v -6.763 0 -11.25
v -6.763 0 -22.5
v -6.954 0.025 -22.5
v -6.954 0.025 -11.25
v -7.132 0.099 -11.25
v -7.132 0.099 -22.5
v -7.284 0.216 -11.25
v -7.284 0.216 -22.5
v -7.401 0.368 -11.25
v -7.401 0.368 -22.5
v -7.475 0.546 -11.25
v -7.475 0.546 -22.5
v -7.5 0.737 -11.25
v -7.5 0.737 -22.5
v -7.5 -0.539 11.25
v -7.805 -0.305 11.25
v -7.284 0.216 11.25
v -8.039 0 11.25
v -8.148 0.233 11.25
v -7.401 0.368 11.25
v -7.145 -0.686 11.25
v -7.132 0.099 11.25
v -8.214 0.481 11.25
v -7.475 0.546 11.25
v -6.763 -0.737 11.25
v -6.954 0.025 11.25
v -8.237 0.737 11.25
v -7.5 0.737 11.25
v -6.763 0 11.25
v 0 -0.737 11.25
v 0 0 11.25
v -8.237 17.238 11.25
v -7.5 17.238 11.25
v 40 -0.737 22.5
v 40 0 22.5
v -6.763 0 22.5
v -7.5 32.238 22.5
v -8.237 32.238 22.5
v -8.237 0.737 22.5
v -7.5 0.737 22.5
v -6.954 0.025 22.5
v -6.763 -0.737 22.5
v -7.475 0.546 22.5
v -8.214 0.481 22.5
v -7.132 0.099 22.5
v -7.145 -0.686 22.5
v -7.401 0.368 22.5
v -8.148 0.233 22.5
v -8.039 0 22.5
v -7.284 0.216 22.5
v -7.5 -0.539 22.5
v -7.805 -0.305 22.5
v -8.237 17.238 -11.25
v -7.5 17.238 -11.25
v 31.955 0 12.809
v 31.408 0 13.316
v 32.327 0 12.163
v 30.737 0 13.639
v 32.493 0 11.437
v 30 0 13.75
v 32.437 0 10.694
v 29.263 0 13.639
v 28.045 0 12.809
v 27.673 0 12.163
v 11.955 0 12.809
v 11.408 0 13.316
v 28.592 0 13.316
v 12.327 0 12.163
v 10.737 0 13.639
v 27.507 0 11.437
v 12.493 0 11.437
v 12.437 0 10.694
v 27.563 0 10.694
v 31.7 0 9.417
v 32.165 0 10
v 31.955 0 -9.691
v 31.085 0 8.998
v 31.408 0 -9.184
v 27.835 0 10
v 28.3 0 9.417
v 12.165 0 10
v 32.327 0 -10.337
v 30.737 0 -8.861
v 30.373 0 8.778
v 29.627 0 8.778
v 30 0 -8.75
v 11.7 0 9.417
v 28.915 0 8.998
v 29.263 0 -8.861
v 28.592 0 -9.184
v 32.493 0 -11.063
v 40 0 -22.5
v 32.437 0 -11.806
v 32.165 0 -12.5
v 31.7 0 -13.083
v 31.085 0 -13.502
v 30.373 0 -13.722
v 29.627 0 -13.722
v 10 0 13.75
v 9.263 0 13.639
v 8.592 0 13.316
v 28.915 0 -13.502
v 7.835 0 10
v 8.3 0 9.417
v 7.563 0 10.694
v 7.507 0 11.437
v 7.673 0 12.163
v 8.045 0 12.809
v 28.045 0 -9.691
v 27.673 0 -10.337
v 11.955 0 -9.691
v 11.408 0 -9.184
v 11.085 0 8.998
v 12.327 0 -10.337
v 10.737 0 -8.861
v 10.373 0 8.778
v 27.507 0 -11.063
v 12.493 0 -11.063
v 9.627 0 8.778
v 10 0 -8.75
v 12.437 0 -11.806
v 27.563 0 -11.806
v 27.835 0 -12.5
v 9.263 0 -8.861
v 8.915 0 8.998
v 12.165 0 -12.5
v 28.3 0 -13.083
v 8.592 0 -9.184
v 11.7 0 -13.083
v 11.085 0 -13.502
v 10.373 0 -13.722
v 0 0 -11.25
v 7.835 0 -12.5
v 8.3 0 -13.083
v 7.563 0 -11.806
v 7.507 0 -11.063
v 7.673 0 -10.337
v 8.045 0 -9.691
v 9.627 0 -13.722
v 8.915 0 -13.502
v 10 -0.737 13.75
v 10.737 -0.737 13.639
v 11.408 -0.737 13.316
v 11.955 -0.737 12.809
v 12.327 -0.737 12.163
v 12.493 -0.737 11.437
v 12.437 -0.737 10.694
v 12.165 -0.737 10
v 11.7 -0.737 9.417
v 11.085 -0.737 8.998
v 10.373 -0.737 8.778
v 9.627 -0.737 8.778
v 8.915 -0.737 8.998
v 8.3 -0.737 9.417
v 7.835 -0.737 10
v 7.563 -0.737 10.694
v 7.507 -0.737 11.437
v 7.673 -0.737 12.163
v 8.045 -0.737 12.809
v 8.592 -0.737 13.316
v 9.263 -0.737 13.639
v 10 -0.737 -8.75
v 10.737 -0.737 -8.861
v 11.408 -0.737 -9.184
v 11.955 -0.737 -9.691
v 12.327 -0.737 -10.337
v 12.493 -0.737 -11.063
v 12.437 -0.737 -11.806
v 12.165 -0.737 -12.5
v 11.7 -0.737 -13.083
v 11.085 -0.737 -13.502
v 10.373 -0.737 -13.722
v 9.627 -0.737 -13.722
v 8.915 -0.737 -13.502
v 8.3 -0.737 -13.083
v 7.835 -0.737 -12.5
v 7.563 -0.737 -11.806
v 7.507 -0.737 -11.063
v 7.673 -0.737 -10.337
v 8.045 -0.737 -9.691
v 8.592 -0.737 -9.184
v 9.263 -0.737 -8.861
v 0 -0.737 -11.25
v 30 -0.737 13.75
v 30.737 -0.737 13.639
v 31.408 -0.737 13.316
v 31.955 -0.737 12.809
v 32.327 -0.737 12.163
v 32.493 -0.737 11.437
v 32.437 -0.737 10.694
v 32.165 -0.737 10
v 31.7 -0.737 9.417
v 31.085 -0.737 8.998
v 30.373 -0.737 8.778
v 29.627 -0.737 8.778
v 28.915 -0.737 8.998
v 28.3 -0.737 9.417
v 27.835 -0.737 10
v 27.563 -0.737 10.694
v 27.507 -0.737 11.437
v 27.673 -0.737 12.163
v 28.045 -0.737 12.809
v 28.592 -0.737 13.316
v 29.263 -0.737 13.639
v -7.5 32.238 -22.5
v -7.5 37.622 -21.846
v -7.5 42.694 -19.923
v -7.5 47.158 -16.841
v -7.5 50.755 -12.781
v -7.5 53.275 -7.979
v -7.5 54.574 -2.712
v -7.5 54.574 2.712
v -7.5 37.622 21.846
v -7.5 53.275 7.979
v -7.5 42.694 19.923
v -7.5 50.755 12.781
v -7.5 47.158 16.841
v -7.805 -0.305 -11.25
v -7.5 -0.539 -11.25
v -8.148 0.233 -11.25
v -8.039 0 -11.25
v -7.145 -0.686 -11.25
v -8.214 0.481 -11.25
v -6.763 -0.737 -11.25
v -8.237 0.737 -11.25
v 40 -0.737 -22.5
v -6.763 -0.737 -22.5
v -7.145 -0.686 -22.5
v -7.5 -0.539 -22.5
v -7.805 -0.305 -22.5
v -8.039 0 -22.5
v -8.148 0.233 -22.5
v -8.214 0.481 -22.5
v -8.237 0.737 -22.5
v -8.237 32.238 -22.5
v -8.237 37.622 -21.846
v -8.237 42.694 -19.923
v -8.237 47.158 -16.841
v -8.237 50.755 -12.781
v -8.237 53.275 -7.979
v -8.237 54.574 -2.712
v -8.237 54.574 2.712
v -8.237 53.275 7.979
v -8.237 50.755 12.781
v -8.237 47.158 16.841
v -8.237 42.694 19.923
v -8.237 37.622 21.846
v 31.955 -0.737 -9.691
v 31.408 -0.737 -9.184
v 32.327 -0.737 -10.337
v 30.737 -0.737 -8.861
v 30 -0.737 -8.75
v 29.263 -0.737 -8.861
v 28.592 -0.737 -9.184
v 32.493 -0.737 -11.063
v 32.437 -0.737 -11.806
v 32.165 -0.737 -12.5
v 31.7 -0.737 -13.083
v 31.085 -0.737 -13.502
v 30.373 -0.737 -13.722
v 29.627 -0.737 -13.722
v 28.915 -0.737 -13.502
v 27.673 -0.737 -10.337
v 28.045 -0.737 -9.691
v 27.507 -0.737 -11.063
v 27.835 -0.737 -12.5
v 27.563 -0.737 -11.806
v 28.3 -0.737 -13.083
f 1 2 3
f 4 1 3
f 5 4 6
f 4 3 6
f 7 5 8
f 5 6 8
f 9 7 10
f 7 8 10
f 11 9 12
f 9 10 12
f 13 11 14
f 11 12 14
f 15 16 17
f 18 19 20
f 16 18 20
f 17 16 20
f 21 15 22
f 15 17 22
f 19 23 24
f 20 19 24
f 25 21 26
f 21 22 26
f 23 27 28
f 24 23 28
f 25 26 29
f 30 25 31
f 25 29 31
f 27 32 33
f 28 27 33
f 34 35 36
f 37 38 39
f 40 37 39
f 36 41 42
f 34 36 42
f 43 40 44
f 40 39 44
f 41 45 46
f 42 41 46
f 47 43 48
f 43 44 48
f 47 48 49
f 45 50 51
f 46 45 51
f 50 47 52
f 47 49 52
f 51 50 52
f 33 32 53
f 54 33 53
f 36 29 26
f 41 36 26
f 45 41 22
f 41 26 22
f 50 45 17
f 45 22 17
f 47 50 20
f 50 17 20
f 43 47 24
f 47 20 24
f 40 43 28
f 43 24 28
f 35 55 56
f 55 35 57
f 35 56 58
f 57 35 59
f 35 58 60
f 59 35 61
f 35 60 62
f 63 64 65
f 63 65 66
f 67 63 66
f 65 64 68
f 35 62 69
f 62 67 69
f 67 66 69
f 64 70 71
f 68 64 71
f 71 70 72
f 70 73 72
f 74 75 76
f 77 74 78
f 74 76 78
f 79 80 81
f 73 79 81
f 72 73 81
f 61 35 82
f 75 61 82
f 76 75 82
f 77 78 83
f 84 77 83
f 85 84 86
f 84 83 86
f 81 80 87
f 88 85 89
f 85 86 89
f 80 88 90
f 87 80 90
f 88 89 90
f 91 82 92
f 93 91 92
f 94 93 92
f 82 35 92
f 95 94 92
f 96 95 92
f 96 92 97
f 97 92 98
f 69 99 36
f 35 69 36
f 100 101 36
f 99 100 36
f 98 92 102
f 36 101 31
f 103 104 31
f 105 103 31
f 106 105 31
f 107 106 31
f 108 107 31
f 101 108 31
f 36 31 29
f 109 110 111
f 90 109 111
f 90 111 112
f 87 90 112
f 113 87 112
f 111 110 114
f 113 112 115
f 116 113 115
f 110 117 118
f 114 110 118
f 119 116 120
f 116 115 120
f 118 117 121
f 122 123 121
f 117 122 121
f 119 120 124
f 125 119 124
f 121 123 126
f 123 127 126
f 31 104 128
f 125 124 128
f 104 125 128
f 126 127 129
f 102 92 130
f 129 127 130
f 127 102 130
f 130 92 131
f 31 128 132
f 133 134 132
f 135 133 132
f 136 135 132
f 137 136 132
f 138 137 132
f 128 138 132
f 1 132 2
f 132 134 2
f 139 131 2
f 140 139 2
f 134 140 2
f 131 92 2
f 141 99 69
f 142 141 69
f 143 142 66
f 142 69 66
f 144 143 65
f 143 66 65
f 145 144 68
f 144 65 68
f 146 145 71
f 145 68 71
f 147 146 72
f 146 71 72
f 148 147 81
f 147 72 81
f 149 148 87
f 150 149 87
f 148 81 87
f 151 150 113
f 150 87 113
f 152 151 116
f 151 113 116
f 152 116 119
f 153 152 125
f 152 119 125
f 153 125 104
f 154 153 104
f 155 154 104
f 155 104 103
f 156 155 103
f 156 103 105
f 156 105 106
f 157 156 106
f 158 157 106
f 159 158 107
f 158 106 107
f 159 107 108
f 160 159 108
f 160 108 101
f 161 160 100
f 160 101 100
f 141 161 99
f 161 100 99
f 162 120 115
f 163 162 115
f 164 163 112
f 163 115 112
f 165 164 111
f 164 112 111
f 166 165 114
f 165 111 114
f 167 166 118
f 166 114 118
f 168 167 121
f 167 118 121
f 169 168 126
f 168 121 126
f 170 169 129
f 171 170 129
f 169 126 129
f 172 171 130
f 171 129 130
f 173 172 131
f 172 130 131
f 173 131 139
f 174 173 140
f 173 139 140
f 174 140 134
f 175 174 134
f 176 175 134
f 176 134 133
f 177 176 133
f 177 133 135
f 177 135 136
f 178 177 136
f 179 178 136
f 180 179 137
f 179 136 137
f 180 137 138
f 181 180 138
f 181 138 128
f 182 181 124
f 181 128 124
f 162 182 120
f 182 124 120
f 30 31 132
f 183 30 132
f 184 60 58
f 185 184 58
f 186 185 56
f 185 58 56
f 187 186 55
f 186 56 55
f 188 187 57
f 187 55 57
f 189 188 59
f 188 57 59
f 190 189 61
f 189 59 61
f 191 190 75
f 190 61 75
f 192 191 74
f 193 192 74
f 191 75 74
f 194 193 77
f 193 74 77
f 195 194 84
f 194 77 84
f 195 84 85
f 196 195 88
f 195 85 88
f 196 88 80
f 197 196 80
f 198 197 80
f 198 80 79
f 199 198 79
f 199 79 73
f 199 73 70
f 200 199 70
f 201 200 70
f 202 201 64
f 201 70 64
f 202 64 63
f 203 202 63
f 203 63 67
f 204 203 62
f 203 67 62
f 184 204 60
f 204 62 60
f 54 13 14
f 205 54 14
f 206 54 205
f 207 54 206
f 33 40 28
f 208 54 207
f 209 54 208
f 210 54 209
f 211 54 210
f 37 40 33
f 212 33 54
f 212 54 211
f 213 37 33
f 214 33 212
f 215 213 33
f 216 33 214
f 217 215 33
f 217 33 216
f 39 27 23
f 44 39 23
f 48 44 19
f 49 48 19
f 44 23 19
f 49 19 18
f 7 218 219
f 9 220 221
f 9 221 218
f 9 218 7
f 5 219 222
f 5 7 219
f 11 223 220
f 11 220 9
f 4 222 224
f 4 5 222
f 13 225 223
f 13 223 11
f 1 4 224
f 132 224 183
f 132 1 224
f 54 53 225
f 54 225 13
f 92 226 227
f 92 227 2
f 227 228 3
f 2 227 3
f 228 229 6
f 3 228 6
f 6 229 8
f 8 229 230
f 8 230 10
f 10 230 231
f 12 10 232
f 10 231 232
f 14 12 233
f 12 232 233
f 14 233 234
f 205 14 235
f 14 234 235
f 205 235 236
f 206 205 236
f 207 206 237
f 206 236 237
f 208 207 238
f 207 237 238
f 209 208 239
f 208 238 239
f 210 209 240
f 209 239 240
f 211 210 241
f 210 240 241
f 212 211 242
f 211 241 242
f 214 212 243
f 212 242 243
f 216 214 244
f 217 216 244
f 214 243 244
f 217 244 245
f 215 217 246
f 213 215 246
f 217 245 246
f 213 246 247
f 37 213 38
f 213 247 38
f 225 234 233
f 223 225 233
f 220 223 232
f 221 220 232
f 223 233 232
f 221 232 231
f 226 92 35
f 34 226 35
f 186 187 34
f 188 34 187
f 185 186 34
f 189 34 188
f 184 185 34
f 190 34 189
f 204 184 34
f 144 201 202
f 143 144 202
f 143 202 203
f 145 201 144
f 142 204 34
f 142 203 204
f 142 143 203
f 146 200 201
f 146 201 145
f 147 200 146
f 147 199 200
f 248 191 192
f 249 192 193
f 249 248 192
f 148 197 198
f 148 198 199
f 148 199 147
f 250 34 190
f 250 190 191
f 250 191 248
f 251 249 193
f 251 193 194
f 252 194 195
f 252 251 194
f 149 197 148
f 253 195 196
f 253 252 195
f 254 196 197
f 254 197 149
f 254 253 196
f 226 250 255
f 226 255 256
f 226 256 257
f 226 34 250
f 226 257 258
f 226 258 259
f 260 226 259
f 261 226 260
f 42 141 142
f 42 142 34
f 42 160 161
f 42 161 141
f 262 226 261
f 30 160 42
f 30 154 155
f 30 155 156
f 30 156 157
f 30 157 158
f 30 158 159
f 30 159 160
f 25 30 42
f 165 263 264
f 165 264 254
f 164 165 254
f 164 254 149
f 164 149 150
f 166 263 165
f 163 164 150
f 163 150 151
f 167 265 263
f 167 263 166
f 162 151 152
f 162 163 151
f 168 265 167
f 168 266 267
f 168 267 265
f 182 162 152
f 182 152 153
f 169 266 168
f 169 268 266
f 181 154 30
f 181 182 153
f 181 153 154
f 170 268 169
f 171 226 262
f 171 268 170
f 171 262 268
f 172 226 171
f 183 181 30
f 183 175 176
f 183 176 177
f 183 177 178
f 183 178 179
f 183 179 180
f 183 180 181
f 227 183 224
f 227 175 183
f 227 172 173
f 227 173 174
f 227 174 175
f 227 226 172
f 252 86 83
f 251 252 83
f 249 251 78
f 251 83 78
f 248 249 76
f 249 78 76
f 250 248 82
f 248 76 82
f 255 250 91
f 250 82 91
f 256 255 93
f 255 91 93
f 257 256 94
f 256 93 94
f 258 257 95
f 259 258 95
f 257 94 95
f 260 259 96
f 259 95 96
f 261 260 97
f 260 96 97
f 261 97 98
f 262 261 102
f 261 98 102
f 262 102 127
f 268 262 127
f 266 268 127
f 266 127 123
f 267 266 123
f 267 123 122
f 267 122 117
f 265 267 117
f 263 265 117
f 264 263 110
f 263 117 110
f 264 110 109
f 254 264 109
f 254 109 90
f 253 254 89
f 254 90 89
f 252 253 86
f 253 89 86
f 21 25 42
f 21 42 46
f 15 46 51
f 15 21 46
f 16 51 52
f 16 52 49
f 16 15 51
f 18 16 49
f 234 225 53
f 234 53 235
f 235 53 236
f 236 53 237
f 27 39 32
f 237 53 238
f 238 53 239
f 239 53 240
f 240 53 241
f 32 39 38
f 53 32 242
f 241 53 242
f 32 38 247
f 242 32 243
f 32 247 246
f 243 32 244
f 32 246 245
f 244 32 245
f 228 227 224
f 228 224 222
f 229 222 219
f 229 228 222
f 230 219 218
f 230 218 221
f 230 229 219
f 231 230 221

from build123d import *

# Parameters (mm, degrees)
SKETCH1_R                  = 2.5
SKETCH1_W                  = 25
SKETCH1_H                  = 22.5
BASE_FLANGE3_DEPTH         = 0.7366
SKETCHED_START             = -22.5
SKETCHED_BEND1_DEPTH       = 45
SKETCHED_BEND1_2_DEPTH     = 11.25
SKETCHED_START_2           = 11.25
SKETCHED_BEND1_3_DEPTH     = 11.25
SKETCHED_START_3           = -63
SKETCHED_BEND1_4_OUTLINE_W = 0.7366
SKETCHED_BEND1_4_OUTLINE_H = 45
SKETCHED_BEND1_4_DEPTH     = 38
SKETCHED_START_4           = -8.2366
SKETCHED_BEND1_5_DEPTH     = 0.7366


with BuildPart() as part:
    # Base-Flange3: sheet metal written as solids
    # Sketch1 → Base-Flange3 (new body)
    with BuildSketch(Plane(origin=(0, 0, 0), x_dir=(1, 0, 0), z_dir=(0, 1, 0))):
        with BuildLine():
            Line((-40, 22.5), (40, 22.5))
            Line((40, 22.5), (40, -22.5))
            Line((40, -22.5), (-40, -22.5))
            ThreePointArc((-40, -22.5), (-62.5, 0), (-40, 22.5))
        make_face()
        with Locations(Location((10, -11.25, 0), (0, 0, 270))):
            Circle(SKETCH1_R, mode=Mode.SUBTRACT)
        with Locations(Location((10, 11.25, 0), (0, 0, 270))):
            Circle(SKETCH1_R, mode=Mode.SUBTRACT)
        with Locations(Location((30, -11.25, 0), (0, 0, 270))):
            Circle(SKETCH1_R, mode=Mode.SUBTRACT)
        with Locations(Location((30, 11.25, 0), (0, 0, 270))):
            Circle(SKETCH1_R, mode=Mode.SUBTRACT)
        with Locations((-12.5, 0)):
            Rectangle(SKETCH1_W, SKETCH1_H, mode=Mode.SUBTRACT)
    extrude(amount=-BASE_FLANGE3_DEPTH)

    # Sketched Bend1: read off the stored shape, not the designer's step
    # Sketched Bend1 outline → Sketched Bend1 (cut)
    with BuildSketch(Plane.XY.offset(SKETCHED_START)):
        with BuildLine():
            ThreePointArc((-6.7634, -0.7366), (-7.5, -0.539228625), (-8.039228625, 0))
            Line((-8.039228625, 0), (-25, 0))
            Line((-25, 0), (-25, -0.7366))
            Line((-25, -0.7366), (-6.7634, -0.7366))
        make_face()
    extrude(amount=SKETCHED_BEND1_DEPTH, mode=Mode.SUBTRACT)

    # Sketched Bend1 2 outline → Sketched Bend1 2 (add)
    with BuildSketch(Plane.XY.offset(SKETCHED_START)):
        with BuildLine():
            Line((-7.5, 17.237627139), (-8.2366, 17.237627139))
            Line((-8.2366, 17.237627139), (-8.2366, 0.7366))
            ThreePointArc((-8.2366, 0.7366), (-8.186401927, 0.355307783), (-8.039228625, 0))
            Line((-8.039228625, 0), (-6.7634, 0))
            ThreePointArc((-6.7634, 0), (-7.284254855, 0.215745145), (-7.5, 0.7366))
            Line((-7.5, 0.7366), (-7.5, 17.237627139))
        make_face()
    extrude(amount=SKETCHED_BEND1_2_DEPTH)

    # Sketched Bend1 3 outline → Sketched Bend1 3 (add)
    with BuildSketch(Plane.XY.offset(SKETCHED_START_2)):
        with BuildLine():
            Line((-7.5, 17.237627139), (-8.2366, 17.237627139))
            Line((-8.2366, 17.237627139), (-8.2366, 0.7366))
            ThreePointArc((-8.2366, 0.7366), (-8.186401927, 0.355307783), (-8.039228625, 0))
            Line((-8.039228625, 0), (-6.7634, 0))
            ThreePointArc((-6.7634, 0), (-7.284254855, 0.215745145), (-7.5, 0.7366))
            Line((-7.5, 0.7366), (-7.5, 17.237627139))
        make_face()
    extrude(amount=SKETCHED_BEND1_3_DEPTH)

    # Sketched Bend1 4 outline → Sketched Bend1 4 (cut)
    with BuildSketch(Plane.YZ.offset(SKETCHED_START_3)):
        with Locations((-0.3683, 0)):
            Rectangle(SKETCHED_BEND1_4_OUTLINE_W, SKETCHED_BEND1_4_OUTLINE_H)
    extrude(amount=SKETCHED_BEND1_4_DEPTH, mode=Mode.SUBTRACT)

    # Sketched Bend1 5 outline → Sketched Bend1 5 (add)
    with BuildSketch(Plane.YZ.offset(SKETCHED_START_4)):
        with BuildLine():
            ThreePointArc((32.237627139, -22.5), (54.737627139, 0), (32.237627139, 22.5))
            Line((32.237627139, 22.5), (17.237627139, 22.5))
            Line((17.237627139, 22.5), (17.237627139, -22.5))
            Line((17.237627139, -22.5), (32.237627139, -22.5))
        make_face()
    extrude(amount=SKETCHED_BEND1_5_DEPTH)


solid = part.part
